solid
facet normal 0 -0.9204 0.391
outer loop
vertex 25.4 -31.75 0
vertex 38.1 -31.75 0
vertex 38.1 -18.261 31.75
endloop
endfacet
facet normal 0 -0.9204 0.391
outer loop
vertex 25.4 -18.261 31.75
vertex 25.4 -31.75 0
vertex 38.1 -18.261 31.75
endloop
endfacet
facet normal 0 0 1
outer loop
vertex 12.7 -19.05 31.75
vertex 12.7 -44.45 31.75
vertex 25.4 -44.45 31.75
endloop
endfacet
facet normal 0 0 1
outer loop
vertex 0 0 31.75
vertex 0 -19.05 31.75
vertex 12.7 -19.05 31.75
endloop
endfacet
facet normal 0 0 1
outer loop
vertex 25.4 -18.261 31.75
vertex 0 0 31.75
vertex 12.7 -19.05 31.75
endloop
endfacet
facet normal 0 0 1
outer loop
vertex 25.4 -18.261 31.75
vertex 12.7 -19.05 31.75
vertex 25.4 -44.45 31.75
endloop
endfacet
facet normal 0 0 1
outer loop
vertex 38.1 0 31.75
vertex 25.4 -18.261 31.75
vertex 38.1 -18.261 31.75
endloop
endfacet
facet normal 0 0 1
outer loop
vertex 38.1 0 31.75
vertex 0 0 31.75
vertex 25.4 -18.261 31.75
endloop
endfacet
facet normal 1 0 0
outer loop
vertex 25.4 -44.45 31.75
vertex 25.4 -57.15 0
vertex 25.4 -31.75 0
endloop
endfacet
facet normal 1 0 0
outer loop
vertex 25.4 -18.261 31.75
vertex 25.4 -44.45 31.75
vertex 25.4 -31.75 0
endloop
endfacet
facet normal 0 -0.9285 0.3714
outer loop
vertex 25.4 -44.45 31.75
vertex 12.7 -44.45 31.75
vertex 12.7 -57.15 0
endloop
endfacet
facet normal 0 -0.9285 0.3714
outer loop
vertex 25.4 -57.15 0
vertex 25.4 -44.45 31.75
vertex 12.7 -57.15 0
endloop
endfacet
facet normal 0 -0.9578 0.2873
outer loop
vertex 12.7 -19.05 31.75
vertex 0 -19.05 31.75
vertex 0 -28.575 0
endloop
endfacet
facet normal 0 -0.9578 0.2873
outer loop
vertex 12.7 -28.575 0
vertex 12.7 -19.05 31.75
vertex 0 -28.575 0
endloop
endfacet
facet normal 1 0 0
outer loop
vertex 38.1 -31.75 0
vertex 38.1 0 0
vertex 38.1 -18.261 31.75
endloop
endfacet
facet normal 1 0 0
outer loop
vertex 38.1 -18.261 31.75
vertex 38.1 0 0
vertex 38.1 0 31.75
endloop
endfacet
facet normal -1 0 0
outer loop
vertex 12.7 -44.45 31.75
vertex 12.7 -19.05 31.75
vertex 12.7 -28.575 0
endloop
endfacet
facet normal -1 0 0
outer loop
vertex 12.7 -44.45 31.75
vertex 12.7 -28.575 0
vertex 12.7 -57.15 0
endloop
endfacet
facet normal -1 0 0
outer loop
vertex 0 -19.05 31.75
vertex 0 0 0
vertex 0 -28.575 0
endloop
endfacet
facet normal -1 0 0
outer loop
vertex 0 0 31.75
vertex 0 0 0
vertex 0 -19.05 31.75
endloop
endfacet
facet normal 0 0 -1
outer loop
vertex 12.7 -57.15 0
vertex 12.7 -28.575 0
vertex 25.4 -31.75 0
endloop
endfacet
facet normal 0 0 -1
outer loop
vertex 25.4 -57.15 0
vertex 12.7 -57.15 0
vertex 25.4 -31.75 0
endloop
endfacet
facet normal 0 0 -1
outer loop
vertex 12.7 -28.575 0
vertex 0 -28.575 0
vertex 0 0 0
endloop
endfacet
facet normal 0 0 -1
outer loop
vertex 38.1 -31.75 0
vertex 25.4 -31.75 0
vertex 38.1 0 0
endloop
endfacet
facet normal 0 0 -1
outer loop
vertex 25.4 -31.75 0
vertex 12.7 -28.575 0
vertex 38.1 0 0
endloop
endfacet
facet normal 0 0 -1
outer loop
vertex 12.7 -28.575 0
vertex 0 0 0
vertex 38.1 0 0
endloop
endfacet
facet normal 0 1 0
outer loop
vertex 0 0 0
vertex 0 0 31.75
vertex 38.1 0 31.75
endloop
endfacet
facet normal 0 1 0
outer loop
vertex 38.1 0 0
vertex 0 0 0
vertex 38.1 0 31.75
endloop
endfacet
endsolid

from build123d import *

# Parameters (mm, degrees)
F0_W     = 38.1
F0_H     = 31.75
F1_DEPTH = 57.15
F3_DEPTH = 12.7
F5_DEPTH = 12.7
F7_DEPTH = 25.4


with BuildPart() as f1:
    # F0 (on Front) → F1 (new body)
    with BuildSketch(Plane.XZ):
        with Locations((19.05, 15.875)):
            Rectangle(F0_W, F0_H)
    extrude(amount=F1_DEPTH)

    # F2 (on face) → F3 (cut)
    with BuildSketch(Plane(origin=(0, 0, 0), x_dir=(0, -1, 0), z_dir=(-1, 0, 0))):
        Polygon((57.15, 31.75), (19.05, 31.75), (28.575, 0), (57.15, 0), align=None)
    extrude(amount=-F3_DEPTH, mode=Mode.SUBTRACT)

    # F4 (on face) → F5 (cut)
    with BuildSketch(Plane.YZ.offset(38.1)):
        Polygon((-31.75, 0), (-18.2607397437, 31.75), (-57.15, 31.75), (-57.15, 0), align=None)
    extrude(amount=-F5_DEPTH, mode=Mode.SUBTRACT)

    # F6 (on face) → F7 (cut)
    with BuildSketch(Plane(origin=(12.7, 0, 0), x_dir=(0, -1, 0), z_dir=(-1, 0, 0))):
        Polygon((57.15, 0), (57.15, 31.75), (44.45, 31.75), align=None)
    extrude(amount=-F7_DEPTH, mode=Mode.SUBTRACT)


solid = f1.part
